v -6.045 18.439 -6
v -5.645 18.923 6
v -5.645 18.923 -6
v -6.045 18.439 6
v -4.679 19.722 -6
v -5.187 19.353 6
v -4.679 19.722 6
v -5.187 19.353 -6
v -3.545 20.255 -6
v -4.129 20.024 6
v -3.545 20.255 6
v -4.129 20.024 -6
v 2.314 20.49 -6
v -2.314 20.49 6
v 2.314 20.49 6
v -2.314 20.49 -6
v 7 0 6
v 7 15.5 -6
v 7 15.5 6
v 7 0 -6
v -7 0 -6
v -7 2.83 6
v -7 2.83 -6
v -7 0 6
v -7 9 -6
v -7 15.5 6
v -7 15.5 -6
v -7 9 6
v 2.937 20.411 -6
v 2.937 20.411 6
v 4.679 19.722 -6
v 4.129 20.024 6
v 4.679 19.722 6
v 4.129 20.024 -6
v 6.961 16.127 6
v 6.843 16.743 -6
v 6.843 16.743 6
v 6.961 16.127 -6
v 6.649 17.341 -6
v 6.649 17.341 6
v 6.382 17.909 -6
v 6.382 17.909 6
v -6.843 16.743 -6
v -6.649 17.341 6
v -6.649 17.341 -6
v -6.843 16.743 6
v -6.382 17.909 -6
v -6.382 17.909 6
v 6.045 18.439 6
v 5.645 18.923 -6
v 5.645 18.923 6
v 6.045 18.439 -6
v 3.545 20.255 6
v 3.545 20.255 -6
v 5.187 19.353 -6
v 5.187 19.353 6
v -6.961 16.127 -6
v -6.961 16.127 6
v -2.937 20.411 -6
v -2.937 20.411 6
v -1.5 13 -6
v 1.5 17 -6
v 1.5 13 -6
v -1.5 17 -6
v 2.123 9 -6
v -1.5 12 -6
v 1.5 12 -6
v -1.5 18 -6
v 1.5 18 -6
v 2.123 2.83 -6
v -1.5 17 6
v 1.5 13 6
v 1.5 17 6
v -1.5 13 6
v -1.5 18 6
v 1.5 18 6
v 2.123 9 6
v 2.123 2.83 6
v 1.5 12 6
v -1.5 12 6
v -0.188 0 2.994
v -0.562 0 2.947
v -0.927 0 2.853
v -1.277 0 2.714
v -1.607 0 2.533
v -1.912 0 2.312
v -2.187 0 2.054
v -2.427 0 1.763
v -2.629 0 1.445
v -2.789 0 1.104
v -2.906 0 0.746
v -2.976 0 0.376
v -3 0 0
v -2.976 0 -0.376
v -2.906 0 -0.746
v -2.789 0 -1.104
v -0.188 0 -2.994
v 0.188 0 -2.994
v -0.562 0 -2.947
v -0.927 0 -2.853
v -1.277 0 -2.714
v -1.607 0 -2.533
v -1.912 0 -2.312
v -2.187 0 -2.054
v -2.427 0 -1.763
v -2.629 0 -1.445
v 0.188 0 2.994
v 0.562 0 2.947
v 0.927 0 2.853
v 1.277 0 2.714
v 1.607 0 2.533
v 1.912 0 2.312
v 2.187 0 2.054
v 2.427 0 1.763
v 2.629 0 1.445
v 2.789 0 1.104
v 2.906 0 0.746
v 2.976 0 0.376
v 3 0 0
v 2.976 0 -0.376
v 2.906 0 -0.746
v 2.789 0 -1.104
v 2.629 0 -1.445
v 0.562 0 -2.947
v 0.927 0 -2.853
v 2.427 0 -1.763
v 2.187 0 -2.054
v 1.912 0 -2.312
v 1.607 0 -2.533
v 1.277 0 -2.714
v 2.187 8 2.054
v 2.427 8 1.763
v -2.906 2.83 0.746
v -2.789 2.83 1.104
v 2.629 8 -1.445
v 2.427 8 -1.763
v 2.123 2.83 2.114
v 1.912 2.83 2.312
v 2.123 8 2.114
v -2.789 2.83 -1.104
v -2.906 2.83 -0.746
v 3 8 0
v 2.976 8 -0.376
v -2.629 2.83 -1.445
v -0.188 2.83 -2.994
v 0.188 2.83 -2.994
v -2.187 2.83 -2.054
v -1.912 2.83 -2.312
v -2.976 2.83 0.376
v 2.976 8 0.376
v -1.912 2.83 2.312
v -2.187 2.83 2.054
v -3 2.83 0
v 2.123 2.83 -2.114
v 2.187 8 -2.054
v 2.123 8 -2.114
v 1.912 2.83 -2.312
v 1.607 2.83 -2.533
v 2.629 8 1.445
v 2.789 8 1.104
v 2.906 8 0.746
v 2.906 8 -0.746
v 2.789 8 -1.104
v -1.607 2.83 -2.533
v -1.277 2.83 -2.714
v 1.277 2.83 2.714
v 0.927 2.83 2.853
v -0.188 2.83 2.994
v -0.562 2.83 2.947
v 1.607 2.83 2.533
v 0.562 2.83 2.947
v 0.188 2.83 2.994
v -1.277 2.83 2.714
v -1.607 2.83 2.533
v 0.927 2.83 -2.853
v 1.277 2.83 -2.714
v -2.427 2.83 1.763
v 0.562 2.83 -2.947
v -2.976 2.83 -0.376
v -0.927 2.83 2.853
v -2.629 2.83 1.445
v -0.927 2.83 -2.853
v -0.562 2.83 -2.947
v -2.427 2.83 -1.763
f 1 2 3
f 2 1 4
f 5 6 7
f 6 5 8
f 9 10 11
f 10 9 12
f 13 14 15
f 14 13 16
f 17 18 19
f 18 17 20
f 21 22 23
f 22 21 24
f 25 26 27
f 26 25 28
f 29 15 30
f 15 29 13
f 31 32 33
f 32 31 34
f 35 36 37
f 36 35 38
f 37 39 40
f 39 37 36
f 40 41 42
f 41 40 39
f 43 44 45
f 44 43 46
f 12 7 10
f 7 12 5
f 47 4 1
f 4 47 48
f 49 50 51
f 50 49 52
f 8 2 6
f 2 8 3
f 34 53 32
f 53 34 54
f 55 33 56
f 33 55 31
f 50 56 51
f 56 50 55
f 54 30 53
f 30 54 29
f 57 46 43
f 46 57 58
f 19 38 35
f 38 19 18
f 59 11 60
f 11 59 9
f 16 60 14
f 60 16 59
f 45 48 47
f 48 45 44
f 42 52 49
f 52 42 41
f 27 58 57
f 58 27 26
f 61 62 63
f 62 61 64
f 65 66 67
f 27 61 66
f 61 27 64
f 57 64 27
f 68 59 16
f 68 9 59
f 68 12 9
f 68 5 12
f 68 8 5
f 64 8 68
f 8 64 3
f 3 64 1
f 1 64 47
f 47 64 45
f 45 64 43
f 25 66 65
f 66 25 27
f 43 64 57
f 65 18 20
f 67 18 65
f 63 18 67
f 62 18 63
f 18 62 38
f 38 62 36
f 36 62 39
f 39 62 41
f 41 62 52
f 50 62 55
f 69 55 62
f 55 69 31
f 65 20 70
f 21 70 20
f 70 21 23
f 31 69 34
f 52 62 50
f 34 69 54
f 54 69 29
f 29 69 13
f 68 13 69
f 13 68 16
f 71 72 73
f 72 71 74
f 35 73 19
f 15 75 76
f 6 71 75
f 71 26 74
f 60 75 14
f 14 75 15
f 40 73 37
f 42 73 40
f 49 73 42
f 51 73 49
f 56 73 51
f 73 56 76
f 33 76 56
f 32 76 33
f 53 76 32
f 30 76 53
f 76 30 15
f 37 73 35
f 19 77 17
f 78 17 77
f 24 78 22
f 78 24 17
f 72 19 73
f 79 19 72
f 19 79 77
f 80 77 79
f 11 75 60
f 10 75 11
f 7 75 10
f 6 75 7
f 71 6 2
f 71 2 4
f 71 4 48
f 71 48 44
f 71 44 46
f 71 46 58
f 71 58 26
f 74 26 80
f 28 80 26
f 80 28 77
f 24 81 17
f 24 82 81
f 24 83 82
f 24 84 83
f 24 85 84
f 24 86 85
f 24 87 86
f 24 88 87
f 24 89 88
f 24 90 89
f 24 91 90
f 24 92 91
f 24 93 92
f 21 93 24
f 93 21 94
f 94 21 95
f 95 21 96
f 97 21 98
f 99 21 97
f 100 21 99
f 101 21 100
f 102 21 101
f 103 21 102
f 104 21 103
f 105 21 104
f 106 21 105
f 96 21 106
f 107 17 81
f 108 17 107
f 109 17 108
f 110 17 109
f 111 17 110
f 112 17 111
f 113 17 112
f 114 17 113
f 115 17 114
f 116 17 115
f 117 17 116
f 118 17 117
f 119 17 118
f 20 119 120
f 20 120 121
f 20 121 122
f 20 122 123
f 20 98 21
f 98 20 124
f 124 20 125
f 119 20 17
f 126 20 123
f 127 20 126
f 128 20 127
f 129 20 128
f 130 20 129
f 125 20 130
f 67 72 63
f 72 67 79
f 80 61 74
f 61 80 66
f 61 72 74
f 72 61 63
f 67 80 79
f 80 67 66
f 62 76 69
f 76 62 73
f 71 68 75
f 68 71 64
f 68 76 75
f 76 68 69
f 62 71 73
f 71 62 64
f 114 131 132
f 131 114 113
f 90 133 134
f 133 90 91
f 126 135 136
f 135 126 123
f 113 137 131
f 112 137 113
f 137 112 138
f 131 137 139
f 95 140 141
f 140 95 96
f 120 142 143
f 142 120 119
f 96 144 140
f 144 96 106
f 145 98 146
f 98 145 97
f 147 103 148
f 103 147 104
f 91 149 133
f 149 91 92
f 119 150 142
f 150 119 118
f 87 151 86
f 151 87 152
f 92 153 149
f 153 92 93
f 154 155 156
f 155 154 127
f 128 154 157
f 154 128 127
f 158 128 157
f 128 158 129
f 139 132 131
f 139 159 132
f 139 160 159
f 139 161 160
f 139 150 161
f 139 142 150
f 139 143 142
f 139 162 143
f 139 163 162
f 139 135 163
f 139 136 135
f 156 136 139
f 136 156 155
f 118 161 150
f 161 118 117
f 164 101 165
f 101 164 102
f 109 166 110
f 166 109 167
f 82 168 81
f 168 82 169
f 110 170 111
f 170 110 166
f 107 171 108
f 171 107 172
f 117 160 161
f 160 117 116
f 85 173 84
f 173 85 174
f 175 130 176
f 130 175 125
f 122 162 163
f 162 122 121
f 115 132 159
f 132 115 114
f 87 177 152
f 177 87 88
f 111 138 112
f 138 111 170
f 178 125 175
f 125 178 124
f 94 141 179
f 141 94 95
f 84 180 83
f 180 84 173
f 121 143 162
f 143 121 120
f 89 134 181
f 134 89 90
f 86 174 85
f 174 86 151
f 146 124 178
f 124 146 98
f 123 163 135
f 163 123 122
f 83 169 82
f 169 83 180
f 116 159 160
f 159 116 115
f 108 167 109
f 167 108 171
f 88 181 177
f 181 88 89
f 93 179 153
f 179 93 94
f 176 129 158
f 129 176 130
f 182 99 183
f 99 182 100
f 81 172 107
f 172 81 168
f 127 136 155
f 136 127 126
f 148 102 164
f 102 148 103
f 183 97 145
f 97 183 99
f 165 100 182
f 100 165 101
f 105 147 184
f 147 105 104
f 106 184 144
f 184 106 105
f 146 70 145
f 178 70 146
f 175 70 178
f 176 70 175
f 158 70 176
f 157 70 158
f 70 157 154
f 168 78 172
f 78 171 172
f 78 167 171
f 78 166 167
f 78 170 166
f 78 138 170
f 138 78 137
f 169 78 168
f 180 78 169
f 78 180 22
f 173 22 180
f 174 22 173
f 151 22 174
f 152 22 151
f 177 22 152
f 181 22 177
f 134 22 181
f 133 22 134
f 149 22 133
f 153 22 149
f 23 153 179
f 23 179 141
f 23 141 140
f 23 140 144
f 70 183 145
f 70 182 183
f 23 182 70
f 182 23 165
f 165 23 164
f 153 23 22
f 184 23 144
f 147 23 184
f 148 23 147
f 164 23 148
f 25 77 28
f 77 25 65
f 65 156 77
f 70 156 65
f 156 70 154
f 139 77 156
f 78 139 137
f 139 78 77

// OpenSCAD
$fn = 50;


difference() {
	union() {
		translate(v = [0, 13.5000000000, -6.0000000000]) {
			rotate(a = [0, 0, 0]) {
				hull() {
					translate(v = [-2.0000000000, 2.0000000000, 0]) {
						rotate(a = [0, 0, 0]) {
							translate(v = [0, 0, 0]) {
								rotate(a = [0, 0, 0]) {
									cylinder(h = 12, r = 5);
								}
							}
						}
					}
					translate(v = [2.0000000000, 2.0000000000, 0]) {
						rotate(a = [0, 0, 0]) {
							translate(v = [0, 0, 0]) {
								rotate(a = [0, 0, 0]) {
									cylinder(h = 12, r = 5);
								}
							}
						}
					}
					translate(v = [-2.0000000000, -2.0000000000, 0]) {
						rotate(a = [0, 0, 0]) {
							translate(v = [0, 0, 0]) {
								rotate(a = [0, 0, 0]) {
									cylinder(h = 12, r = 5);
								}
							}
						}
					}
					translate(v = [2.0000000000, -2.0000000000, 0]) {
						rotate(a = [0, 0, 0]) {
							translate(v = [0, 0, 0]) {
								rotate(a = [0, 0, 0]) {
									cylinder(h = 12, r = 5);
								}
							}
						}
					}
				}
			}
		}
		translate(v = [-7.0000000000, 0, -6.0000000000]) {
			rotate(a = [0, 0, 0]) {
				cube(size = [14, 13.5000000000, 12]);
			}
		}
	}
	union() {
		translate(v = [-1.5000000000, 12.0000000000, -50]) {
			rotate(a = [0, 0, 0]) {
				cube(size = [3, 1, 100]);
			}
		}
		translate(v = [-1.5000000000, 17.0000000000, -50]) {
			rotate(a = [0, 0, 0]) {
				cube(size = [3, 1, 100]);
			}
		}
		translate(v = [0.0000000000, 8, 0]) {
			rotate(a = [90, 0, 0]) {
				cylinder(h = 8, r = 3.0000000000);
			}
		}
		translate(v = [-7.2357019064, 9, -75]) {
			rotate(a = [90, 0, 0]) {
				cube(size = [9.3587521664, 100, 6.1700000000]);
			}
		}
	}
}
